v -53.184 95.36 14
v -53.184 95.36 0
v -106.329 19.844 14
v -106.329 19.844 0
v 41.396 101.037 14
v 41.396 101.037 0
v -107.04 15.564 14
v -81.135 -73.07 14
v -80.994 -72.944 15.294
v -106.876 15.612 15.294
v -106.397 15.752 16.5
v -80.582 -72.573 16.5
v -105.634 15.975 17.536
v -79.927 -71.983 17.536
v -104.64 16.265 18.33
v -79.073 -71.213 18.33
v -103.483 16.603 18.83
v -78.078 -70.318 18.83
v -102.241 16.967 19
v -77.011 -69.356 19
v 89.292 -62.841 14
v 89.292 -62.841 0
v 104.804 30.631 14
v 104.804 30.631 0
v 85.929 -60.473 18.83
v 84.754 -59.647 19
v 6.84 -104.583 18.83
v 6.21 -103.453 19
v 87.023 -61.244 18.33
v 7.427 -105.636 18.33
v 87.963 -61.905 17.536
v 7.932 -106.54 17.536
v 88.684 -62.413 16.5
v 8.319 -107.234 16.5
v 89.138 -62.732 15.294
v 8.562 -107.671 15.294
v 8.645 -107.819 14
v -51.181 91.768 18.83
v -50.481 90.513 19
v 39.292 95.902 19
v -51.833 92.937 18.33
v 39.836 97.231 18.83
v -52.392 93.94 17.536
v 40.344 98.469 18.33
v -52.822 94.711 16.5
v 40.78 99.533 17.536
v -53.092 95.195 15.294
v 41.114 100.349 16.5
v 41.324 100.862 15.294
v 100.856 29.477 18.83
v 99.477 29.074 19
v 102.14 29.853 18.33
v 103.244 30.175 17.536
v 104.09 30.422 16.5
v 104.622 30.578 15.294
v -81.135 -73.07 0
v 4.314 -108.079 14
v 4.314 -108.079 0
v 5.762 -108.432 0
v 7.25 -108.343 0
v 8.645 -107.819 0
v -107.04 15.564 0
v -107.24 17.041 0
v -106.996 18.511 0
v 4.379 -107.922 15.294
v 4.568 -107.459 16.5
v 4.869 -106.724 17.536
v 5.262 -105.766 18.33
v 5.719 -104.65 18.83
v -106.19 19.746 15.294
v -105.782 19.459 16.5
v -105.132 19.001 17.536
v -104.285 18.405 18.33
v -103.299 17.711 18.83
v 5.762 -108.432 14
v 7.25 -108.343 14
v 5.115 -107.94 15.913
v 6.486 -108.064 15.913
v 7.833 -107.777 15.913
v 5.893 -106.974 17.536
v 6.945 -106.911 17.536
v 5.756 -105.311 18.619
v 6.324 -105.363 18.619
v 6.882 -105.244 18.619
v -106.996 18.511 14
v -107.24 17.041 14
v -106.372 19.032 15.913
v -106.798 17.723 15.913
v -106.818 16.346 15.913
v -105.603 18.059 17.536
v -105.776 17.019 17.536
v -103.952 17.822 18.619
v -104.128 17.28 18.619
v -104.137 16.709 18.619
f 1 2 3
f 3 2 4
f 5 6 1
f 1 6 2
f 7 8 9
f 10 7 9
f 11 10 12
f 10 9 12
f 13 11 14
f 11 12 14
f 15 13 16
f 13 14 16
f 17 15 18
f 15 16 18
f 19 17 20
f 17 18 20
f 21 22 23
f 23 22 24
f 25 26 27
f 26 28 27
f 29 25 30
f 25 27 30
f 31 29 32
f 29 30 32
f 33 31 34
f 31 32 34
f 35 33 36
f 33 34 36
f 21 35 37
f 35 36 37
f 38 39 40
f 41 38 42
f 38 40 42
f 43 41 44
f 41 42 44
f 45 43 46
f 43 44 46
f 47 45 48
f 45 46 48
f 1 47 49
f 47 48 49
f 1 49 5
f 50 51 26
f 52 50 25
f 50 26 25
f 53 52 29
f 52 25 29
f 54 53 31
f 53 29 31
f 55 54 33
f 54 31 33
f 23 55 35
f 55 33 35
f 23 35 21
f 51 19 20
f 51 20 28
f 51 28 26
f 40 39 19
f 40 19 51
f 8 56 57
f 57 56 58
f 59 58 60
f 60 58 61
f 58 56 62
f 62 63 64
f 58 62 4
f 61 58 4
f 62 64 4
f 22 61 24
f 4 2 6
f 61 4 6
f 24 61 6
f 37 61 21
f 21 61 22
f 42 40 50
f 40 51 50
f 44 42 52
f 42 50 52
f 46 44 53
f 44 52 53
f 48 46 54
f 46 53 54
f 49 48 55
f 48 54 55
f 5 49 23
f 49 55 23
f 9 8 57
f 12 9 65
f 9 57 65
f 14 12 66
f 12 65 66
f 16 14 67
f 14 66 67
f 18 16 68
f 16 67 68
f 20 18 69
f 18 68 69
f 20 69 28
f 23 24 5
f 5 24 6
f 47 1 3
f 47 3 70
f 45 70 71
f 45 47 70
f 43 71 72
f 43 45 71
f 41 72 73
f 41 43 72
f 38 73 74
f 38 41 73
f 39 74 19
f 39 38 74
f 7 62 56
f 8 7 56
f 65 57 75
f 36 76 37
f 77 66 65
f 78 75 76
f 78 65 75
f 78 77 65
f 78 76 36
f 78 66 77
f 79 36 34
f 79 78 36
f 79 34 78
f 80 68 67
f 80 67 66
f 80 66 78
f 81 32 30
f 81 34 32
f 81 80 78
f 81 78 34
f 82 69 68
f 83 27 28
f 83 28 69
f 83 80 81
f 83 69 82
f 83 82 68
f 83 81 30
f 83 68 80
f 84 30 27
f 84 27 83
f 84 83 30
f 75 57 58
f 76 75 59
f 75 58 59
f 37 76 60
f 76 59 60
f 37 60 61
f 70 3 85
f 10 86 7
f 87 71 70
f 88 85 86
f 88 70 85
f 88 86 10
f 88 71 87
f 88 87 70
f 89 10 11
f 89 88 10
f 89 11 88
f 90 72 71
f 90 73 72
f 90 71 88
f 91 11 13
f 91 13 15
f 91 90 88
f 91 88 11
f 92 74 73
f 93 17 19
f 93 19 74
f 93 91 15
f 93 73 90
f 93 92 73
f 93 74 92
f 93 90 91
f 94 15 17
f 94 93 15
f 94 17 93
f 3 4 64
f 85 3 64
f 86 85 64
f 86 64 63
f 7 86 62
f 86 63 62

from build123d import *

# Parameters (mm, degrees)
F1_DEPTH     = 19
F2_R         = 5
F3_T1_DEPTH  = 104.8421979693
F3_T3_DEPTH  = 119.7500710634
F3_T5_DEPTH  = 119.7500710634
F3_T7_DEPTH  = 119.7500710634
F3_T9_DEPTH  = 104.8421979693
F3_T11_DEPTH = 20.0196827351
F3_T16_DEPTH = 5
F3_T22_DEPTH = 5


# Not quite as in the source:
# - a fillet or chamfer that OpenCascade refuses, or shapes differently, is made with other operations: its cross-section is extruded or revolved along the edge and cut away or added


with BuildPart() as f1:
    # F0 (on Top) → F1 (new body)
    with BuildSketch(Plane.XY):
        Polygon((41.3957443257, 101.0370281819), (-53.1841051002, 95.3600528356), (-107.7152386276, 17.8750127135), (-81.134600478, -73.0702765657), (6.5420466758, -108.9921572289), (89.2923992493, -62.8407204639), (104.8037539551, 30.6310605275), align=None)
    extrude(amount=F1_DEPTH)

    # F2
    f2_edges = [f1.edges().sort_by_distance(p)[0] for p in [
        (-94.42492, -27.597632, 19),
        (-37.296277, -91.031217, 19),
    ]]
    fillet(f2_edges, radius=F2_R)

    # F3: fillet of radius 5 on 7 edges, made by hand

    # F3_s2 → F3_t1 (cut)
    with BuildSketch(Plane(origin=(-39.2722507137, -21.9028770158, 0), x_dir=(0, 0, 1), z_dir=(0.8733539896, 0.4870860385, 0))):
        with BuildLine():
            ThreePointArc((19, 93.3752749449), (17.5355339059, 96.9108088508), (14, 98.3752749449))
            Line((14, 98.3752749449), (19, 98.3752749449))
            Line((19, 98.3752749449), (19, 93.3752749449))
        make_face()
    extrude(amount=F3_T1_DEPTH, mode=Mode.SUBTRACT)

    # F3_s4 → F3_t3 (cut)
    with BuildSketch(Plane(origin=(-9.8020286817, -59.067250771, 0), x_dir=(0, 0, 1), z_dir=(0.1637081063, 0.986508822, 0))):
        with BuildLine():
            ThreePointArc((19, 93.3752749449), (17.5355339059, 96.9108088508), (14, 98.3752749449))
            Line((14, 98.3752749449), (19, 98.3752749449))
            Line((19, 98.3752749449), (19, 93.3752749449))
        make_face()
    extrude(amount=F3_T3_DEPTH, mode=Mode.SUBTRACT)

    # F3_s6 → F3_t5 (cut)
    with BuildSketch(Plane(origin=(40.0691713151, -44.4913630949, 0), x_dir=(0, 0, 1), z_dir=(-0.66921332, 0.7430703414, 0))):
        with BuildLine():
            ThreePointArc((19, 93.3752749449), (17.5355339059, 96.9108088508), (14, 98.3752749449))
            Line((14, 98.3752749449), (19, 98.3752749449))
            Line((19, 98.3752749449), (19, 93.3752749449))
        make_face()
    extrude(amount=F3_T5_DEPTH, mode=Mode.SUBTRACT)

    # F3_s8 → F3_t7 (cut)
    with BuildSketch(Plane(origin=(59.7674680494, 3.58742845, 0), x_dir=(0, 0, 1), z_dir=(-0.9982034669, -0.0599152621, 0))):
        with BuildLine():
            ThreePointArc((19, 93.3752749449), (17.5355339059, 96.9108088508), (14, 98.3752749449))
            Line((14, 98.3752749449), (19, 98.3752749449))
            Line((19, 98.3752749449), (19, 93.3752749449))
        make_face()
    extrude(amount=F3_T7_DEPTH, mode=Mode.SUBTRACT)

    # F3_s10 → F3_t9 (cut)
    with BuildSketch(Plane(origin=(34.4596423084, 48.9648132019, 0), x_dir=(0, 0, 1), z_dir=(-0.5755260436, -0.8177834513, 0))):
        with BuildLine():
            ThreePointArc((14, 98.3752749449), (17.5355339059, 96.9108088508), (19, 93.3752749449))
            Line((19, 93.3752749449), (19, 98.3752749449))
            Line((19, 98.3752749449), (14, 98.3752749449))
        make_face()
    extrude(amount=F3_T9_DEPTH, mode=Mode.SUBTRACT)

    # F3_s12 → F3_t11 (cut)
    with BuildSketch(Plane.XY.offset(-6.0196827351)):
        with BuildLine():
            ThreePointArc((-106.3294449524, 19.8441314825), (-107.1730718062, 17.7850417962), (-107.0397478053, 15.5638301188))
            Line((-107.0397478053, 15.5638301188), (-107.7152386276, 17.8750127135))
            Line((-107.7152386276, 17.8750127135), (-106.3294449524, 19.8441314825))
        make_face()
        with BuildLine():
            ThreePointArc((4.3139297226, -108.0792784419), (6.5091183669, -108.443563249), (8.6449722488, -107.8193158622))
            Line((8.6449722488, -107.8193158622), (6.5420466758, -108.9921572289))
            Line((6.5420466758, -108.9921572289), (4.3139297226, -108.0792784419))
        make_face()
    extrude(amount=F3_T11_DEPTH, mode=Mode.SUBTRACT)


with BuildPart() as f3_tool14:
    # F3_s15 → F3_t16 (new body)
    with BuildSketch(Plane.XY.offset(14)):
        Polygon((6.2095420561, -103.4525459145), (4.3139297226, -108.0792784419), (6.5420466758, -108.9921572289), (8.6449722488, -107.8193158622), align=None)
    extrude(amount=F3_T16_DEPTH)

    # F3_s17 → F3_t18 (revolve, cut)
    with BuildSketch(Plane(origin=(6.2095420561, -103.4525459145, 14), x_dir=(-0.0599152621, 0.9982034669, 0), z_dir=(0.9982034669, 0.0599152621, 0))):
        with BuildLine():
            ThreePointArc((0, -5), (5, 0), (0, 5))
            Line((0, 5), (0, -5))
        make_face()
    revolve(axis=Axis((6.2095420561, -103.4525459145, 14), (0, 0, 1)), mode=Mode.SUBTRACT)


with BuildPart() as f1_1:
    add(f1.part)

    # F3_t13: cut F3_tool14
    add(f3_tool14.part, mode=Mode.SUBTRACT)


with BuildPart() as f3_tool20:
    # F3_s21 → F3_t22 (new body)
    with BuildSketch(Plane.XY.offset(14)):
        Polygon((-102.240527696, 16.9665012646), (-106.3294449524, 19.8441314825), (-107.7152386276, 17.8750127135), (-107.0397478053, 15.5638301188), align=None)
    extrude(amount=F3_T22_DEPTH)

    # F3_s23 → F3_t24 (revolve, cut)
    with BuildSketch(Plane(origin=(-102.240527696, 16.9665012646, 14), x_dir=(0.986508822, -0.1637081063, 0), z_dir=(-0.1637081063, -0.986508822, 0))):
        with BuildLine():
            ThreePointArc((0, -5), (5, 0), (0, 5))
            Line((0, 5), (0, -5))
        make_face()
    revolve(axis=Axis((-102.240527696, 16.9665012646, 14), (0, 0, 1)), mode=Mode.SUBTRACT)


with BuildPart() as f1_2:
    add(f1_1.part)

    # F3_t19: cut F3_tool20
    add(f3_tool20.part, mode=Mode.SUBTRACT)


solid = f1_2.part
